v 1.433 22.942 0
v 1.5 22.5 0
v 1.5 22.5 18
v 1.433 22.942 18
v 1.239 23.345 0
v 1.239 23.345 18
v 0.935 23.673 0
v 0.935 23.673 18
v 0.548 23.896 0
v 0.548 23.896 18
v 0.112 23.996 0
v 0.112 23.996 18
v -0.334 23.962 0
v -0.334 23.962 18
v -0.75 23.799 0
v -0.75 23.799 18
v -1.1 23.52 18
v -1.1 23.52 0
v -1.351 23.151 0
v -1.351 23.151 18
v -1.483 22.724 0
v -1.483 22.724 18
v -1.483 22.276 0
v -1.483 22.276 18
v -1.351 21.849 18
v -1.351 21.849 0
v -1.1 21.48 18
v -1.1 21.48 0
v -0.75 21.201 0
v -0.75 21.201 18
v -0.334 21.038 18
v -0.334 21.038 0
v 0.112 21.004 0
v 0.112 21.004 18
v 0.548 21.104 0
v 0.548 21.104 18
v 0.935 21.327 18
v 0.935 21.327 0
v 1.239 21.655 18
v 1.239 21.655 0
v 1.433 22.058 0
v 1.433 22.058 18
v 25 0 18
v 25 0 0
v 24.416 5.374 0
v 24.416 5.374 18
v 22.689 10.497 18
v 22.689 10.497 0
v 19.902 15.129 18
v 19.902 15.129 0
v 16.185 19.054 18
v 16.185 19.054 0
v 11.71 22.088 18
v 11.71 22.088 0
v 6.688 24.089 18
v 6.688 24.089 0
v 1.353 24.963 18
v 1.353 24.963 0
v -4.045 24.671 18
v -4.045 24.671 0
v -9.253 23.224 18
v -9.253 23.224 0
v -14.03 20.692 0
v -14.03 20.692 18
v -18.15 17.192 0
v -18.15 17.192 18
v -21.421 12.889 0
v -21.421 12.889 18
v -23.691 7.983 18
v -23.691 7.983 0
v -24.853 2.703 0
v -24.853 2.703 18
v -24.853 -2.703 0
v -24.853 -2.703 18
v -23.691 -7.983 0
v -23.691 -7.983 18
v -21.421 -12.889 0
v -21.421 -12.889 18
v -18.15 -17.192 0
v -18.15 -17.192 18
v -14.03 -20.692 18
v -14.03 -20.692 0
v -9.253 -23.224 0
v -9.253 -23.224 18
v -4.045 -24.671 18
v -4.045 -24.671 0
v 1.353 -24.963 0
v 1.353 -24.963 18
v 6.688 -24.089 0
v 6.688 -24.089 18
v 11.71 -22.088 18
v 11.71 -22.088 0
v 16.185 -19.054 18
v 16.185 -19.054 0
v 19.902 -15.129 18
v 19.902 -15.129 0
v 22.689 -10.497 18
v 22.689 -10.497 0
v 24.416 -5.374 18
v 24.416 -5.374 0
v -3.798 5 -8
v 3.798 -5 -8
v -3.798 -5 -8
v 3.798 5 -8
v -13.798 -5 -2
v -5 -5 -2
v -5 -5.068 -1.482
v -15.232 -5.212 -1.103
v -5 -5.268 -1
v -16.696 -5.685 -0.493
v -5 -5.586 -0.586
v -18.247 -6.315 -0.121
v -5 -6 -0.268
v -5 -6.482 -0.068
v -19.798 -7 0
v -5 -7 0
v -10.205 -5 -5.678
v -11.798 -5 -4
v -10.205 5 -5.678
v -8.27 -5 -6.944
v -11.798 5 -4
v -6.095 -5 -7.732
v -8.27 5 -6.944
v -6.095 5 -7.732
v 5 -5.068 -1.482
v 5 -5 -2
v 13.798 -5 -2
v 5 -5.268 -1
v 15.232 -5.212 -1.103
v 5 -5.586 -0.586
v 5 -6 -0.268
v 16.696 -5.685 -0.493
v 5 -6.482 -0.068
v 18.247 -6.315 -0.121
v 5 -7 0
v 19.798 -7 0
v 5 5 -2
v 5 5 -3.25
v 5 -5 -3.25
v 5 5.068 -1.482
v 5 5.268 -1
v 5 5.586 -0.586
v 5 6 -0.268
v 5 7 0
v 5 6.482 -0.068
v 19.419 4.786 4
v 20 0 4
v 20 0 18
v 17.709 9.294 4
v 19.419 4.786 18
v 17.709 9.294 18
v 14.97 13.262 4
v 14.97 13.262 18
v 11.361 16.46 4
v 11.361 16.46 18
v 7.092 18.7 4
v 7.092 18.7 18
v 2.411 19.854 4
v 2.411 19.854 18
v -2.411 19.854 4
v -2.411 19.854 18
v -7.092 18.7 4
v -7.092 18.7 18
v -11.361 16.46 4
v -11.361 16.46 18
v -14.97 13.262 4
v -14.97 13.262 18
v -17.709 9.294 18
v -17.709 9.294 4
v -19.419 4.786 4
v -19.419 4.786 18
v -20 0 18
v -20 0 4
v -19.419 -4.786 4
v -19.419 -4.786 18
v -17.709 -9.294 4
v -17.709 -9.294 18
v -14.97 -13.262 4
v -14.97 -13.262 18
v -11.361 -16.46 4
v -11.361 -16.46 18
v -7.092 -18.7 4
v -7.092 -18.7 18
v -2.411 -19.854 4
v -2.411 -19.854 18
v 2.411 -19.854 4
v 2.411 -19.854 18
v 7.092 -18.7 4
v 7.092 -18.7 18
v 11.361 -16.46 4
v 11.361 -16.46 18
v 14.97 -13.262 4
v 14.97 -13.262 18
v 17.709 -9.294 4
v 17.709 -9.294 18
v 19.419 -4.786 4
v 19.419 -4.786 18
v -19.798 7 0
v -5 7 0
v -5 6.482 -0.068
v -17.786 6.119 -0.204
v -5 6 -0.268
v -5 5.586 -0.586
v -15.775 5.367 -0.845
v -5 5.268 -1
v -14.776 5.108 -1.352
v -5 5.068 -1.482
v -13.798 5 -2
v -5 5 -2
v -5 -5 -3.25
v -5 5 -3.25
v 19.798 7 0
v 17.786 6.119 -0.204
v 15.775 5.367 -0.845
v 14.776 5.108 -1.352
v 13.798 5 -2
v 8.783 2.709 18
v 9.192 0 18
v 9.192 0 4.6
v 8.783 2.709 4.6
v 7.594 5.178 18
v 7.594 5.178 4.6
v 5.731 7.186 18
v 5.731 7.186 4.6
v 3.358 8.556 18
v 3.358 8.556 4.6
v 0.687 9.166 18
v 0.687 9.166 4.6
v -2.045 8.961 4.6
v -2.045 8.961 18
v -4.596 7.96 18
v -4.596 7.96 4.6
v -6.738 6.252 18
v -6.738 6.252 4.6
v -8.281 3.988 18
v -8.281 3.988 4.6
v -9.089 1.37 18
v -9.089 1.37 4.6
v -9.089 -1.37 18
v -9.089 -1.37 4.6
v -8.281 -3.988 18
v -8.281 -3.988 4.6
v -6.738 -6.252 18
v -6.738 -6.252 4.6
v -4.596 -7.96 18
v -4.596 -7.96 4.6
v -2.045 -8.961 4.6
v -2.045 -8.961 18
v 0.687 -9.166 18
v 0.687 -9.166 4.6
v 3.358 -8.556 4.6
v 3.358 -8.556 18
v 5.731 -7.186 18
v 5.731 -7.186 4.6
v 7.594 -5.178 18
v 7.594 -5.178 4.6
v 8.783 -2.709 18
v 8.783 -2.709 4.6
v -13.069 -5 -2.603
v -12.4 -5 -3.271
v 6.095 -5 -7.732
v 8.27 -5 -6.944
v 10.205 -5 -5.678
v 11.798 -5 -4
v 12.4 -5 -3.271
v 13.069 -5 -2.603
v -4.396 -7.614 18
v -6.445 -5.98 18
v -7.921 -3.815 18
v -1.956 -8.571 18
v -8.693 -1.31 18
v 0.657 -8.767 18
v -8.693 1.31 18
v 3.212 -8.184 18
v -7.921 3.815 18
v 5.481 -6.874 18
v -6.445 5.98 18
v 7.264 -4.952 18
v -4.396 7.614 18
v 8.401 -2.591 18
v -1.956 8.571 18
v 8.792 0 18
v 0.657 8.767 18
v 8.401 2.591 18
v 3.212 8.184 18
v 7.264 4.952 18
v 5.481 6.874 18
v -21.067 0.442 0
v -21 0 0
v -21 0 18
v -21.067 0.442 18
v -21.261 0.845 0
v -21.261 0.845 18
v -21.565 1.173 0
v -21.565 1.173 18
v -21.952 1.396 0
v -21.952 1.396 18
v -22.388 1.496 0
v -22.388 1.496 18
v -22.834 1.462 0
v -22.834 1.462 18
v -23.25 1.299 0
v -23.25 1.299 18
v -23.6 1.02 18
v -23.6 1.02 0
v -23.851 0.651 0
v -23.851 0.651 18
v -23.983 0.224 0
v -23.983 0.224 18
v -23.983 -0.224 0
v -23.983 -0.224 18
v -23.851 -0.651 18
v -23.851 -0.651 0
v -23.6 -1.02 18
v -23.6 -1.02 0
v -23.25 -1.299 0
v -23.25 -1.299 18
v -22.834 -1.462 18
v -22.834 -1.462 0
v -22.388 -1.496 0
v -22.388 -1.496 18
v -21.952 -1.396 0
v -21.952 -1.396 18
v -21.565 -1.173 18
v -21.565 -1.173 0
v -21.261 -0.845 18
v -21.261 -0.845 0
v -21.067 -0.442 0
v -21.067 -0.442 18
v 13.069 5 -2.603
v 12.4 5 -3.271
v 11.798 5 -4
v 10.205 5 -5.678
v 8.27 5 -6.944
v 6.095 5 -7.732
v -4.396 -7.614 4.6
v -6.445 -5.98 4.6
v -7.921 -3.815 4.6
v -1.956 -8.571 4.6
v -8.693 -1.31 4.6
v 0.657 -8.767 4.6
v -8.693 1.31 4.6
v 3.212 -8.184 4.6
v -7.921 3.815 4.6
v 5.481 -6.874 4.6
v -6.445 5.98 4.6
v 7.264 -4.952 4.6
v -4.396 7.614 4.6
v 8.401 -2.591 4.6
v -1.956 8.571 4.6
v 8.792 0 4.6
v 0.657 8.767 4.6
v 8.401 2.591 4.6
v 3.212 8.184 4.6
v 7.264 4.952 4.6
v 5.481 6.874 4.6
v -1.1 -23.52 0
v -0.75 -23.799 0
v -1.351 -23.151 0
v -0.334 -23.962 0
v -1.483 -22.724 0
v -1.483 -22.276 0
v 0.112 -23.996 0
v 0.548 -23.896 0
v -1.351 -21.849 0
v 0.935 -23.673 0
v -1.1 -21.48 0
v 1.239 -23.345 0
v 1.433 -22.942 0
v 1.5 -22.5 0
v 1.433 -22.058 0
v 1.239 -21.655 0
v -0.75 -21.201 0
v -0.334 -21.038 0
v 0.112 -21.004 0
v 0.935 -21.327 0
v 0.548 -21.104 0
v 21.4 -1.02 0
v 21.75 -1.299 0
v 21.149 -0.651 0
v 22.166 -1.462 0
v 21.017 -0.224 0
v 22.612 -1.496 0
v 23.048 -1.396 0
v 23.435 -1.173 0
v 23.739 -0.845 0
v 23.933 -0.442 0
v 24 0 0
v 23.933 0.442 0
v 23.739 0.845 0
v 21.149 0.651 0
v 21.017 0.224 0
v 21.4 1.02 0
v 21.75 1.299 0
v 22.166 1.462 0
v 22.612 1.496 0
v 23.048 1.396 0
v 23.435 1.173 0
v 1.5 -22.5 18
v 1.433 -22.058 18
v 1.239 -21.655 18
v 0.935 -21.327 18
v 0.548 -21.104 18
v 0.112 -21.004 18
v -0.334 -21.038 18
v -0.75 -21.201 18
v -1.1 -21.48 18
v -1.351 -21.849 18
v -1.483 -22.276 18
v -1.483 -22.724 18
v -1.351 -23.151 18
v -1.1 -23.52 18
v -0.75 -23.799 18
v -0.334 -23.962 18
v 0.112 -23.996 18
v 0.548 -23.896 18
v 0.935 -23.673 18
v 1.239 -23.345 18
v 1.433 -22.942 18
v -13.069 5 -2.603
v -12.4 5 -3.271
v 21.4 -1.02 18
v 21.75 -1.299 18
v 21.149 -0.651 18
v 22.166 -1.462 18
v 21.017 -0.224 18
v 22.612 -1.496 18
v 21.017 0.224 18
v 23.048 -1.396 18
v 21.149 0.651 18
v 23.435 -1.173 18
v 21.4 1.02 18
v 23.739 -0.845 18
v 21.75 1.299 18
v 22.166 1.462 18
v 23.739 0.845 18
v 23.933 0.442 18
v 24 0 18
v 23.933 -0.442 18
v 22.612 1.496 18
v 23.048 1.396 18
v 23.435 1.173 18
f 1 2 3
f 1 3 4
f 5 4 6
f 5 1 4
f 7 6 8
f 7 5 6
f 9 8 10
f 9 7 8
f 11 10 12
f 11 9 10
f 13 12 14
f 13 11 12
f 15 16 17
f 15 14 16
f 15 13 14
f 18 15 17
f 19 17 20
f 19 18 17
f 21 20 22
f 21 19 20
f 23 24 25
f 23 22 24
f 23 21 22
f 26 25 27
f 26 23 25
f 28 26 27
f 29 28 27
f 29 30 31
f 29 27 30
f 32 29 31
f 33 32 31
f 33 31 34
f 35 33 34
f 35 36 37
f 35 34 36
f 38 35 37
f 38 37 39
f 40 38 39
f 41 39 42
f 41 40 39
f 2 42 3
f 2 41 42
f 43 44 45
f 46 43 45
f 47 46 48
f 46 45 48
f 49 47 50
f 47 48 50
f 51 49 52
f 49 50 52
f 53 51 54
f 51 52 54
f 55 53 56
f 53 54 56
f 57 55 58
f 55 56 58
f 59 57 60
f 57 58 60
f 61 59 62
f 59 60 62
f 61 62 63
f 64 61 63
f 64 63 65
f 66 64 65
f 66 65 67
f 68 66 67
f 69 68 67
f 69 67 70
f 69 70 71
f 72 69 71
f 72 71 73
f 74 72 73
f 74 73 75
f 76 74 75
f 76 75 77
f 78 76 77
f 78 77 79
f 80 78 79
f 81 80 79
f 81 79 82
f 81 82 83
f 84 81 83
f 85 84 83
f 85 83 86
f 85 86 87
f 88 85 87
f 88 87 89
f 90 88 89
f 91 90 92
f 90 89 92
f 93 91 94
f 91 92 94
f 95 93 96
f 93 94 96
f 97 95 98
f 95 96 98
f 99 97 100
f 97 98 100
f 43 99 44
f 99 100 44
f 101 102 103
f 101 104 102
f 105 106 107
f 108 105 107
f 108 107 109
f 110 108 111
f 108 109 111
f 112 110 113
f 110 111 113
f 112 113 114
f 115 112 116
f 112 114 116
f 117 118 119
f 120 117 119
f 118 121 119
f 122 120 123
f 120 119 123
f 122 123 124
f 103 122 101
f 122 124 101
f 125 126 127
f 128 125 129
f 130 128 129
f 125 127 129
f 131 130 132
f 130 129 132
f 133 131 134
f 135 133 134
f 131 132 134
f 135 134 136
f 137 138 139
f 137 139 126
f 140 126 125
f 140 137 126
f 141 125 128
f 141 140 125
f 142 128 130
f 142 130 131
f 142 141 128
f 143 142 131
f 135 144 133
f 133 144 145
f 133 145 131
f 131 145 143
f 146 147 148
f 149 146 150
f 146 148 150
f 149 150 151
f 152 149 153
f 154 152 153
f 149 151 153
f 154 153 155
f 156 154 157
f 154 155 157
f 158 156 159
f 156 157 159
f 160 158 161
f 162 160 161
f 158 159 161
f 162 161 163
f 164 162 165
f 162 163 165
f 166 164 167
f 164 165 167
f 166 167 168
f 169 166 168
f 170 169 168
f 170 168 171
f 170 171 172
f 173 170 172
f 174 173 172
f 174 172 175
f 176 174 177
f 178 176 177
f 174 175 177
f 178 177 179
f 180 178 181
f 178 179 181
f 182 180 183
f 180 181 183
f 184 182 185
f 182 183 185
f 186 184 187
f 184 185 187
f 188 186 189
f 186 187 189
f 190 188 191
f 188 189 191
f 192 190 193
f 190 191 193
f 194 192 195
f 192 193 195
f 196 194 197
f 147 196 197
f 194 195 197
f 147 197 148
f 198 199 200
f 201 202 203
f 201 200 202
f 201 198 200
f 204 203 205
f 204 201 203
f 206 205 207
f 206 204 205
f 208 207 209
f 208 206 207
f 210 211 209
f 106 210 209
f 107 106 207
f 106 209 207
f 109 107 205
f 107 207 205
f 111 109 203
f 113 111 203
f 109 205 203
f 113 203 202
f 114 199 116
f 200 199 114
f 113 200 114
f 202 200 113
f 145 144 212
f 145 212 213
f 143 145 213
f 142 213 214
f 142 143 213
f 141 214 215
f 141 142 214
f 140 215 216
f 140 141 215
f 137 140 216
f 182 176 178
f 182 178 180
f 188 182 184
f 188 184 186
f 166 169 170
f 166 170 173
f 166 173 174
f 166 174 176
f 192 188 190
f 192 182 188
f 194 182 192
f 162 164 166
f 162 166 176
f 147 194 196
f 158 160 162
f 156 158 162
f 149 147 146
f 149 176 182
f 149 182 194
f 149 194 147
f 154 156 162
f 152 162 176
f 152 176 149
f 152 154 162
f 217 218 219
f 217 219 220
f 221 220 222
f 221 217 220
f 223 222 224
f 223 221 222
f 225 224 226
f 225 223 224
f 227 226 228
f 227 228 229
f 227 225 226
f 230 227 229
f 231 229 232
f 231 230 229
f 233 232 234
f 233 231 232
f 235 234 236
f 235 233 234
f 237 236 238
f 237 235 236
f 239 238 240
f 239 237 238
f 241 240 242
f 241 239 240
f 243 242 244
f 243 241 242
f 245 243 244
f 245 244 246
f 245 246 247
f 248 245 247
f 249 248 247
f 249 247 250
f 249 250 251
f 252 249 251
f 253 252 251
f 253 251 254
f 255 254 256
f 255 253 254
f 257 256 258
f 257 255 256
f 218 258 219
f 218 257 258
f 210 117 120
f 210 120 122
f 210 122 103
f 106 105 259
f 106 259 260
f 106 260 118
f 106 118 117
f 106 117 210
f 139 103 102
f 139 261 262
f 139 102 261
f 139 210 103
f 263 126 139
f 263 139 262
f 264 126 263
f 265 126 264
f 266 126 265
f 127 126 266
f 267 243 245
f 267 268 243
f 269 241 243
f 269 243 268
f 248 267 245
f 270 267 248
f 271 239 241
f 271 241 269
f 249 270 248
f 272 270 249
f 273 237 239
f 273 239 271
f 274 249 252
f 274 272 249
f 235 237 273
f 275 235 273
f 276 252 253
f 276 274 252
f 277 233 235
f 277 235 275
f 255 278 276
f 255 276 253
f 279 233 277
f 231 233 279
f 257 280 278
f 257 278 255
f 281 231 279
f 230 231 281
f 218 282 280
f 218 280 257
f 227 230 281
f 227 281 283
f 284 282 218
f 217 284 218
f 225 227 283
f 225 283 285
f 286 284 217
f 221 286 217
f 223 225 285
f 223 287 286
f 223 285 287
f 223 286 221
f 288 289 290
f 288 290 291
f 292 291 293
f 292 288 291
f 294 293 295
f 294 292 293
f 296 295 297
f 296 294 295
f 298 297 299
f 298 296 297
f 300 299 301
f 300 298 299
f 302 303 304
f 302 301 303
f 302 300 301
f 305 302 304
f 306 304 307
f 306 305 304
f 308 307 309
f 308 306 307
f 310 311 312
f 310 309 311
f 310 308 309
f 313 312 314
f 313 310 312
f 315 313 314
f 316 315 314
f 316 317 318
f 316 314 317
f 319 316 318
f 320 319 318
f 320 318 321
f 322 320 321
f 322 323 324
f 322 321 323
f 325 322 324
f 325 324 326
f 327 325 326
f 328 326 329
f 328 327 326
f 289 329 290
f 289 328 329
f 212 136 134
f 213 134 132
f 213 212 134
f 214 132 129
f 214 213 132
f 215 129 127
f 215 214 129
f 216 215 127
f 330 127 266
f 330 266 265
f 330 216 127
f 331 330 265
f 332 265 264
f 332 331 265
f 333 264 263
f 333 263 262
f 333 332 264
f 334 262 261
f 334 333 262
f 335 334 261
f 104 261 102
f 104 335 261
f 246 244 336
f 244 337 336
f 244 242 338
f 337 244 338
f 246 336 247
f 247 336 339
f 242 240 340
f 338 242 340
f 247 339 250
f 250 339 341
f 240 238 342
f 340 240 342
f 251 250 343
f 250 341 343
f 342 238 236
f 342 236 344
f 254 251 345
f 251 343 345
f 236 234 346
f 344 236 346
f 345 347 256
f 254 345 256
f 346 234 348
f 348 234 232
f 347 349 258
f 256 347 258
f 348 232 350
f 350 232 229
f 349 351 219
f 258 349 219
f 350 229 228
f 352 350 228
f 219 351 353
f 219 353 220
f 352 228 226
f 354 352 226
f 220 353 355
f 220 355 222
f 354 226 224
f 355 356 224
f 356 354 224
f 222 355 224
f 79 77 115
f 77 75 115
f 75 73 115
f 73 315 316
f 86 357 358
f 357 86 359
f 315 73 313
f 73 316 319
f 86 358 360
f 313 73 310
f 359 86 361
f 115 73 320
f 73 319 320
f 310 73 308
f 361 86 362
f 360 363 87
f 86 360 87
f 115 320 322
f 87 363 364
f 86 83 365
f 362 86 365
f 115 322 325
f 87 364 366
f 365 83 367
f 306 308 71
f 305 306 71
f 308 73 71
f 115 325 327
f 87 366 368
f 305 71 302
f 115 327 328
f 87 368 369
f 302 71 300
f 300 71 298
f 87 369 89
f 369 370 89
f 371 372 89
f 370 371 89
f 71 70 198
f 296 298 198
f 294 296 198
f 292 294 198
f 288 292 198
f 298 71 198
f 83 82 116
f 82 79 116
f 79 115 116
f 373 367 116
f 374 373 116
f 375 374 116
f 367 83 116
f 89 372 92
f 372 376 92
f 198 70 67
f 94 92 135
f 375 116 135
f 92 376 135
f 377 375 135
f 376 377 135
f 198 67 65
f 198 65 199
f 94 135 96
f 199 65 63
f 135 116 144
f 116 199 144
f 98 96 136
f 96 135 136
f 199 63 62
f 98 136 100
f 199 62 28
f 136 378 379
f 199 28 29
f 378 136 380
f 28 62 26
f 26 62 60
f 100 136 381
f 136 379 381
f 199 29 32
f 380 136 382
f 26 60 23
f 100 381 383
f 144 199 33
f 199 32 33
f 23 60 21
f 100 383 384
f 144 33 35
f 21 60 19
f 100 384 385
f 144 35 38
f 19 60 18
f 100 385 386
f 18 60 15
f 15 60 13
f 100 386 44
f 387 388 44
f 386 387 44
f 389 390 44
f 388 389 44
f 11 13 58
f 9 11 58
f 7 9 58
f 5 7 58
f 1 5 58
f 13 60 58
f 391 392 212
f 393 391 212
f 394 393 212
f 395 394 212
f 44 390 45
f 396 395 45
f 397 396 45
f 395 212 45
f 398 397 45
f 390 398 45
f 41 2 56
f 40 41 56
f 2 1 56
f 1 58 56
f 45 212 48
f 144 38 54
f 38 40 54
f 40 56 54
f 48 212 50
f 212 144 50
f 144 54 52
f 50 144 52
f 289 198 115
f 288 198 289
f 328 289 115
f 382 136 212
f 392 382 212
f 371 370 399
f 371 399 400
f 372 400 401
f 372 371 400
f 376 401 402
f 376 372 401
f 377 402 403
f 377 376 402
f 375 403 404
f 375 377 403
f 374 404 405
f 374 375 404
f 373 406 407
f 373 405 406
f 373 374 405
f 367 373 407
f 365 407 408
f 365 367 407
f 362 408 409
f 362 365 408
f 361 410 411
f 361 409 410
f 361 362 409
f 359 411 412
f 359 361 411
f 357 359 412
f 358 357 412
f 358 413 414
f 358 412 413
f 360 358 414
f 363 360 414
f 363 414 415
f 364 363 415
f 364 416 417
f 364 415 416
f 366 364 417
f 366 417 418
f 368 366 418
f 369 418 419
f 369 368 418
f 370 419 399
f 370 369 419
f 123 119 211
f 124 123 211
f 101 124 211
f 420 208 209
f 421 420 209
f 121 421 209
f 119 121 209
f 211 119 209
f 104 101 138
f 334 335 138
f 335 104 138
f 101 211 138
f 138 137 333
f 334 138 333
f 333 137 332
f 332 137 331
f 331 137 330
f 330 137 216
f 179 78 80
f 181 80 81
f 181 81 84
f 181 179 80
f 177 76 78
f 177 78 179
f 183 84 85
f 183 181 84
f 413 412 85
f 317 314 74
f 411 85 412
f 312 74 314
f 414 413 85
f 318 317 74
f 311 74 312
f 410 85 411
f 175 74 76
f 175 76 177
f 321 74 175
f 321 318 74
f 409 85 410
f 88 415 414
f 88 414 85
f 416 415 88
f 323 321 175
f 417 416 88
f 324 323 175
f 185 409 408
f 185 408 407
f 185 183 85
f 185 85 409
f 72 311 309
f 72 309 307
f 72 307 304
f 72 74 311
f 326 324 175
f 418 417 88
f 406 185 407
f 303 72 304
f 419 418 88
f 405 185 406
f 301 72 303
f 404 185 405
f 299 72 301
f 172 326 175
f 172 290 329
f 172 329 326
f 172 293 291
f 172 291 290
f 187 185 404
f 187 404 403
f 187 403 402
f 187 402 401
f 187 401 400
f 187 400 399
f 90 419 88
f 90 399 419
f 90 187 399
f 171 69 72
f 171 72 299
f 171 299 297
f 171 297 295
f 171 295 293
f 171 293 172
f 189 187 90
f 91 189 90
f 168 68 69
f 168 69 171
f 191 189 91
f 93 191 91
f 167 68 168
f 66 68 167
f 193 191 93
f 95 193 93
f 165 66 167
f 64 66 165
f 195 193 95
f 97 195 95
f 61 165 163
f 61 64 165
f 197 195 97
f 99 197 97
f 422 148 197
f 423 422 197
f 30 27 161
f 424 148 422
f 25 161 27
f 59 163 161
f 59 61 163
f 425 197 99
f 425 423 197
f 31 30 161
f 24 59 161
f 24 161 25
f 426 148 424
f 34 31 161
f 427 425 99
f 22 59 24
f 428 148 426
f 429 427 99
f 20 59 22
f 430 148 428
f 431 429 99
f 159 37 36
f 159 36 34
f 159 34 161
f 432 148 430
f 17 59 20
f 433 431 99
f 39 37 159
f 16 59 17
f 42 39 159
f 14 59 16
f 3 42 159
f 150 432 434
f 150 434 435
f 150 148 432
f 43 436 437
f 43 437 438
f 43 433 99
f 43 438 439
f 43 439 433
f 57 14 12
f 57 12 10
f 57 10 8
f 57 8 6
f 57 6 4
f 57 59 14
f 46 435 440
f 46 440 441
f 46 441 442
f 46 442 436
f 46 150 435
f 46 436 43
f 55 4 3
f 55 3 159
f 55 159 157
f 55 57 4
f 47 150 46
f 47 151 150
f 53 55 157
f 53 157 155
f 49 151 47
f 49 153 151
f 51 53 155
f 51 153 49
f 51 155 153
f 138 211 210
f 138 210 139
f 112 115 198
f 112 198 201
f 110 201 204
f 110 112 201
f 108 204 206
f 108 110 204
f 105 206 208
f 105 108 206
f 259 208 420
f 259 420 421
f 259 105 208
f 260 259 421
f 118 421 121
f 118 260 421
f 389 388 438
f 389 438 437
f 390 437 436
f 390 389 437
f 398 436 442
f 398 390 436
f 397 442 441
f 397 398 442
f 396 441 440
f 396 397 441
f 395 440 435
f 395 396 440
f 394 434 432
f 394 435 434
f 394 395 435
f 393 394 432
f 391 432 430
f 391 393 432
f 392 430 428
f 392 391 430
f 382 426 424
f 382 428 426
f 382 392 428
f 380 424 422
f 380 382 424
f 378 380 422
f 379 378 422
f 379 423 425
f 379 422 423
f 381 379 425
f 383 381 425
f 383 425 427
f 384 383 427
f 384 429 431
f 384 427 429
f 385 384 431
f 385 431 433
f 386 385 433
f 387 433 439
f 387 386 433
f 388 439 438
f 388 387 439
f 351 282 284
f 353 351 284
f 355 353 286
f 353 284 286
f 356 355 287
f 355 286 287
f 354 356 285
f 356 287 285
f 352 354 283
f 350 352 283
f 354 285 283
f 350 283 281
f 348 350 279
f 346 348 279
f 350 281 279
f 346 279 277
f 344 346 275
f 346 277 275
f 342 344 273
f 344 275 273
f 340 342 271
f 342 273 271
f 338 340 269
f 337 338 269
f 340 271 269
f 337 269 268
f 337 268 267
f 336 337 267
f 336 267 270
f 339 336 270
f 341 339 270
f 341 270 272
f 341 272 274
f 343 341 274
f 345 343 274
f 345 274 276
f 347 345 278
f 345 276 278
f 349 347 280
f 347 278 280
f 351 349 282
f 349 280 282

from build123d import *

# Parameters (mm, degrees)
SKETCH1_R               = 25
BOSS_EXTRUDE1_DEPTH     = 18
SKETCH2_R               = 20
CUT_EXTRUDE1_DEPTH      = 14
SKETCH3_W               = 20
SKETCH3_H               = 10
BOSS_EXTRUDE2_DEPTH     = 8
FILLET2_R               = 10
FILLET3_R               = 10
FILLET4_R               = 2
CUT_EXTRUDE2_DEPTH      = 44
CUT_EXTRUDE2_DEPTH_BACK = 44
SKETCH4_W               = 10
SKETCH4_H               = 3.25
CUT_EXTRUDE3_DEPTH      = 44.886216515
CUT_EXTRUDE3_DEPTH_BACK = 44.886216515
SKETCH5_R               = 1.5
SKETCH6_R               = 9.191539394
SKETCH6_R_2             = 8.791539394
BOSS_EXTRUDE3_DEPTH     = 13.4


with BuildPart() as part:
    # Sketch1 → Boss-Extrude1 (new body)
    with BuildSketch(Plane.XY):
        Circle(SKETCH1_R)
    extrude(amount=BOSS_EXTRUDE1_DEPTH)

    # Sketch2 → Cut-Extrude1 (cut)
    with BuildSketch(Plane.XY.offset(18)):
        Circle(SKETCH2_R)
    extrude(amount=-CUT_EXTRUDE1_DEPTH, mode=Mode.SUBTRACT)

    # Sketch3 → Boss-Extrude2 (add)
    with BuildSketch(Plane(origin=(0, 0, 0), x_dir=(-1, 0, 0), z_dir=(0, 0, -1))):
        Rectangle(SKETCH3_W, SKETCH3_H)
    extrude(amount=BOSS_EXTRUDE2_DEPTH)

    # Fillet2
    # the kernel refuses this fillet: 10 mm, written as the material it adds along each edge
    with BuildSketch(Plane(origin=(-10, -5, 0), x_dir=(-1, 0, 0), z_dir=(0, 1, 0)), Plane(origin=(10, 5, 0), x_dir=(1, 0, 0), z_dir=(0, -1, 0))) as fillet2_piece_1:
        with BuildLine():
            CenterArc((9.797958971, -10), FILLET2_R, 90, 78.463040967)
            Line((0, -8), (-0.195959179, -7.96))
            ThreePointArc((-0.195959179, -7.96), (-0.2, -4), (-0.2, 0))
            Line((-0.2, 0), (0, 0.2))
            Line((0, 0.2), (9.797958971, 0.2))
            Line((9.797958971, 0.2), (9.797958971, 0))
        make_face()
    extrude(amount=10)

    # Fillet3
    fillet3_edges = [part.edges().sort_by_distance(p)[0] for p in [
        (-10, 0, -8),
        (10, 0, -8),
    ]]
    fillet(fillet3_edges, radius=FILLET3_R)

    # Fillet4
    fillet4_edges = [part.edges().sort_by_distance(p)[0] for p in [
        (0, 5, 0),
        (0, -5, 0),
    ]]
    fillet(fillet4_edges, radius=FILLET4_R)

    # Sketch4 → Cut-Extrude2 (cut, two sides: drawn at the far end of the back side and taken through both)
    with BuildSketch(Plane.XZ.offset(5).offset(-CUT_EXTRUDE2_DEPTH_BACK)):
        with Locations((0, -1.625)):
            Rectangle(SKETCH4_W, SKETCH4_H)
    extrude(amount=CUT_EXTRUDE2_DEPTH + CUT_EXTRUDE2_DEPTH_BACK, mode=Mode.SUBTRACT)

    # Sketch5 → Cut-Extrude3 (cut, two sides: drawn at the far end of the back side and taken through both)
    with BuildSketch(Plane.XY.offset(18).offset(-CUT_EXTRUDE3_DEPTH_BACK)):
        with Locations((0, 22.5)):
            Circle(SKETCH5_R)
        with Locations((22.5, 0)):
            Circle(SKETCH5_R)
        with Locations((0, -22.5)):
            Circle(SKETCH5_R)
        with Locations((-22.5, 0)):
            Circle(SKETCH5_R)
    extrude(amount=CUT_EXTRUDE3_DEPTH + CUT_EXTRUDE3_DEPTH_BACK, mode=Mode.SUBTRACT)


with BuildPart() as body_2:
    # Sketch6 → Boss-Extrude3 (new body)
    with BuildSketch(Plane.XY.offset(18)):
        Circle(SKETCH6_R)
        Circle(SKETCH6_R_2, mode=Mode.SUBTRACT)
    extrude(amount=-BOSS_EXTRUDE3_DEPTH)


solid = Compound([part.part, body_2.part])
